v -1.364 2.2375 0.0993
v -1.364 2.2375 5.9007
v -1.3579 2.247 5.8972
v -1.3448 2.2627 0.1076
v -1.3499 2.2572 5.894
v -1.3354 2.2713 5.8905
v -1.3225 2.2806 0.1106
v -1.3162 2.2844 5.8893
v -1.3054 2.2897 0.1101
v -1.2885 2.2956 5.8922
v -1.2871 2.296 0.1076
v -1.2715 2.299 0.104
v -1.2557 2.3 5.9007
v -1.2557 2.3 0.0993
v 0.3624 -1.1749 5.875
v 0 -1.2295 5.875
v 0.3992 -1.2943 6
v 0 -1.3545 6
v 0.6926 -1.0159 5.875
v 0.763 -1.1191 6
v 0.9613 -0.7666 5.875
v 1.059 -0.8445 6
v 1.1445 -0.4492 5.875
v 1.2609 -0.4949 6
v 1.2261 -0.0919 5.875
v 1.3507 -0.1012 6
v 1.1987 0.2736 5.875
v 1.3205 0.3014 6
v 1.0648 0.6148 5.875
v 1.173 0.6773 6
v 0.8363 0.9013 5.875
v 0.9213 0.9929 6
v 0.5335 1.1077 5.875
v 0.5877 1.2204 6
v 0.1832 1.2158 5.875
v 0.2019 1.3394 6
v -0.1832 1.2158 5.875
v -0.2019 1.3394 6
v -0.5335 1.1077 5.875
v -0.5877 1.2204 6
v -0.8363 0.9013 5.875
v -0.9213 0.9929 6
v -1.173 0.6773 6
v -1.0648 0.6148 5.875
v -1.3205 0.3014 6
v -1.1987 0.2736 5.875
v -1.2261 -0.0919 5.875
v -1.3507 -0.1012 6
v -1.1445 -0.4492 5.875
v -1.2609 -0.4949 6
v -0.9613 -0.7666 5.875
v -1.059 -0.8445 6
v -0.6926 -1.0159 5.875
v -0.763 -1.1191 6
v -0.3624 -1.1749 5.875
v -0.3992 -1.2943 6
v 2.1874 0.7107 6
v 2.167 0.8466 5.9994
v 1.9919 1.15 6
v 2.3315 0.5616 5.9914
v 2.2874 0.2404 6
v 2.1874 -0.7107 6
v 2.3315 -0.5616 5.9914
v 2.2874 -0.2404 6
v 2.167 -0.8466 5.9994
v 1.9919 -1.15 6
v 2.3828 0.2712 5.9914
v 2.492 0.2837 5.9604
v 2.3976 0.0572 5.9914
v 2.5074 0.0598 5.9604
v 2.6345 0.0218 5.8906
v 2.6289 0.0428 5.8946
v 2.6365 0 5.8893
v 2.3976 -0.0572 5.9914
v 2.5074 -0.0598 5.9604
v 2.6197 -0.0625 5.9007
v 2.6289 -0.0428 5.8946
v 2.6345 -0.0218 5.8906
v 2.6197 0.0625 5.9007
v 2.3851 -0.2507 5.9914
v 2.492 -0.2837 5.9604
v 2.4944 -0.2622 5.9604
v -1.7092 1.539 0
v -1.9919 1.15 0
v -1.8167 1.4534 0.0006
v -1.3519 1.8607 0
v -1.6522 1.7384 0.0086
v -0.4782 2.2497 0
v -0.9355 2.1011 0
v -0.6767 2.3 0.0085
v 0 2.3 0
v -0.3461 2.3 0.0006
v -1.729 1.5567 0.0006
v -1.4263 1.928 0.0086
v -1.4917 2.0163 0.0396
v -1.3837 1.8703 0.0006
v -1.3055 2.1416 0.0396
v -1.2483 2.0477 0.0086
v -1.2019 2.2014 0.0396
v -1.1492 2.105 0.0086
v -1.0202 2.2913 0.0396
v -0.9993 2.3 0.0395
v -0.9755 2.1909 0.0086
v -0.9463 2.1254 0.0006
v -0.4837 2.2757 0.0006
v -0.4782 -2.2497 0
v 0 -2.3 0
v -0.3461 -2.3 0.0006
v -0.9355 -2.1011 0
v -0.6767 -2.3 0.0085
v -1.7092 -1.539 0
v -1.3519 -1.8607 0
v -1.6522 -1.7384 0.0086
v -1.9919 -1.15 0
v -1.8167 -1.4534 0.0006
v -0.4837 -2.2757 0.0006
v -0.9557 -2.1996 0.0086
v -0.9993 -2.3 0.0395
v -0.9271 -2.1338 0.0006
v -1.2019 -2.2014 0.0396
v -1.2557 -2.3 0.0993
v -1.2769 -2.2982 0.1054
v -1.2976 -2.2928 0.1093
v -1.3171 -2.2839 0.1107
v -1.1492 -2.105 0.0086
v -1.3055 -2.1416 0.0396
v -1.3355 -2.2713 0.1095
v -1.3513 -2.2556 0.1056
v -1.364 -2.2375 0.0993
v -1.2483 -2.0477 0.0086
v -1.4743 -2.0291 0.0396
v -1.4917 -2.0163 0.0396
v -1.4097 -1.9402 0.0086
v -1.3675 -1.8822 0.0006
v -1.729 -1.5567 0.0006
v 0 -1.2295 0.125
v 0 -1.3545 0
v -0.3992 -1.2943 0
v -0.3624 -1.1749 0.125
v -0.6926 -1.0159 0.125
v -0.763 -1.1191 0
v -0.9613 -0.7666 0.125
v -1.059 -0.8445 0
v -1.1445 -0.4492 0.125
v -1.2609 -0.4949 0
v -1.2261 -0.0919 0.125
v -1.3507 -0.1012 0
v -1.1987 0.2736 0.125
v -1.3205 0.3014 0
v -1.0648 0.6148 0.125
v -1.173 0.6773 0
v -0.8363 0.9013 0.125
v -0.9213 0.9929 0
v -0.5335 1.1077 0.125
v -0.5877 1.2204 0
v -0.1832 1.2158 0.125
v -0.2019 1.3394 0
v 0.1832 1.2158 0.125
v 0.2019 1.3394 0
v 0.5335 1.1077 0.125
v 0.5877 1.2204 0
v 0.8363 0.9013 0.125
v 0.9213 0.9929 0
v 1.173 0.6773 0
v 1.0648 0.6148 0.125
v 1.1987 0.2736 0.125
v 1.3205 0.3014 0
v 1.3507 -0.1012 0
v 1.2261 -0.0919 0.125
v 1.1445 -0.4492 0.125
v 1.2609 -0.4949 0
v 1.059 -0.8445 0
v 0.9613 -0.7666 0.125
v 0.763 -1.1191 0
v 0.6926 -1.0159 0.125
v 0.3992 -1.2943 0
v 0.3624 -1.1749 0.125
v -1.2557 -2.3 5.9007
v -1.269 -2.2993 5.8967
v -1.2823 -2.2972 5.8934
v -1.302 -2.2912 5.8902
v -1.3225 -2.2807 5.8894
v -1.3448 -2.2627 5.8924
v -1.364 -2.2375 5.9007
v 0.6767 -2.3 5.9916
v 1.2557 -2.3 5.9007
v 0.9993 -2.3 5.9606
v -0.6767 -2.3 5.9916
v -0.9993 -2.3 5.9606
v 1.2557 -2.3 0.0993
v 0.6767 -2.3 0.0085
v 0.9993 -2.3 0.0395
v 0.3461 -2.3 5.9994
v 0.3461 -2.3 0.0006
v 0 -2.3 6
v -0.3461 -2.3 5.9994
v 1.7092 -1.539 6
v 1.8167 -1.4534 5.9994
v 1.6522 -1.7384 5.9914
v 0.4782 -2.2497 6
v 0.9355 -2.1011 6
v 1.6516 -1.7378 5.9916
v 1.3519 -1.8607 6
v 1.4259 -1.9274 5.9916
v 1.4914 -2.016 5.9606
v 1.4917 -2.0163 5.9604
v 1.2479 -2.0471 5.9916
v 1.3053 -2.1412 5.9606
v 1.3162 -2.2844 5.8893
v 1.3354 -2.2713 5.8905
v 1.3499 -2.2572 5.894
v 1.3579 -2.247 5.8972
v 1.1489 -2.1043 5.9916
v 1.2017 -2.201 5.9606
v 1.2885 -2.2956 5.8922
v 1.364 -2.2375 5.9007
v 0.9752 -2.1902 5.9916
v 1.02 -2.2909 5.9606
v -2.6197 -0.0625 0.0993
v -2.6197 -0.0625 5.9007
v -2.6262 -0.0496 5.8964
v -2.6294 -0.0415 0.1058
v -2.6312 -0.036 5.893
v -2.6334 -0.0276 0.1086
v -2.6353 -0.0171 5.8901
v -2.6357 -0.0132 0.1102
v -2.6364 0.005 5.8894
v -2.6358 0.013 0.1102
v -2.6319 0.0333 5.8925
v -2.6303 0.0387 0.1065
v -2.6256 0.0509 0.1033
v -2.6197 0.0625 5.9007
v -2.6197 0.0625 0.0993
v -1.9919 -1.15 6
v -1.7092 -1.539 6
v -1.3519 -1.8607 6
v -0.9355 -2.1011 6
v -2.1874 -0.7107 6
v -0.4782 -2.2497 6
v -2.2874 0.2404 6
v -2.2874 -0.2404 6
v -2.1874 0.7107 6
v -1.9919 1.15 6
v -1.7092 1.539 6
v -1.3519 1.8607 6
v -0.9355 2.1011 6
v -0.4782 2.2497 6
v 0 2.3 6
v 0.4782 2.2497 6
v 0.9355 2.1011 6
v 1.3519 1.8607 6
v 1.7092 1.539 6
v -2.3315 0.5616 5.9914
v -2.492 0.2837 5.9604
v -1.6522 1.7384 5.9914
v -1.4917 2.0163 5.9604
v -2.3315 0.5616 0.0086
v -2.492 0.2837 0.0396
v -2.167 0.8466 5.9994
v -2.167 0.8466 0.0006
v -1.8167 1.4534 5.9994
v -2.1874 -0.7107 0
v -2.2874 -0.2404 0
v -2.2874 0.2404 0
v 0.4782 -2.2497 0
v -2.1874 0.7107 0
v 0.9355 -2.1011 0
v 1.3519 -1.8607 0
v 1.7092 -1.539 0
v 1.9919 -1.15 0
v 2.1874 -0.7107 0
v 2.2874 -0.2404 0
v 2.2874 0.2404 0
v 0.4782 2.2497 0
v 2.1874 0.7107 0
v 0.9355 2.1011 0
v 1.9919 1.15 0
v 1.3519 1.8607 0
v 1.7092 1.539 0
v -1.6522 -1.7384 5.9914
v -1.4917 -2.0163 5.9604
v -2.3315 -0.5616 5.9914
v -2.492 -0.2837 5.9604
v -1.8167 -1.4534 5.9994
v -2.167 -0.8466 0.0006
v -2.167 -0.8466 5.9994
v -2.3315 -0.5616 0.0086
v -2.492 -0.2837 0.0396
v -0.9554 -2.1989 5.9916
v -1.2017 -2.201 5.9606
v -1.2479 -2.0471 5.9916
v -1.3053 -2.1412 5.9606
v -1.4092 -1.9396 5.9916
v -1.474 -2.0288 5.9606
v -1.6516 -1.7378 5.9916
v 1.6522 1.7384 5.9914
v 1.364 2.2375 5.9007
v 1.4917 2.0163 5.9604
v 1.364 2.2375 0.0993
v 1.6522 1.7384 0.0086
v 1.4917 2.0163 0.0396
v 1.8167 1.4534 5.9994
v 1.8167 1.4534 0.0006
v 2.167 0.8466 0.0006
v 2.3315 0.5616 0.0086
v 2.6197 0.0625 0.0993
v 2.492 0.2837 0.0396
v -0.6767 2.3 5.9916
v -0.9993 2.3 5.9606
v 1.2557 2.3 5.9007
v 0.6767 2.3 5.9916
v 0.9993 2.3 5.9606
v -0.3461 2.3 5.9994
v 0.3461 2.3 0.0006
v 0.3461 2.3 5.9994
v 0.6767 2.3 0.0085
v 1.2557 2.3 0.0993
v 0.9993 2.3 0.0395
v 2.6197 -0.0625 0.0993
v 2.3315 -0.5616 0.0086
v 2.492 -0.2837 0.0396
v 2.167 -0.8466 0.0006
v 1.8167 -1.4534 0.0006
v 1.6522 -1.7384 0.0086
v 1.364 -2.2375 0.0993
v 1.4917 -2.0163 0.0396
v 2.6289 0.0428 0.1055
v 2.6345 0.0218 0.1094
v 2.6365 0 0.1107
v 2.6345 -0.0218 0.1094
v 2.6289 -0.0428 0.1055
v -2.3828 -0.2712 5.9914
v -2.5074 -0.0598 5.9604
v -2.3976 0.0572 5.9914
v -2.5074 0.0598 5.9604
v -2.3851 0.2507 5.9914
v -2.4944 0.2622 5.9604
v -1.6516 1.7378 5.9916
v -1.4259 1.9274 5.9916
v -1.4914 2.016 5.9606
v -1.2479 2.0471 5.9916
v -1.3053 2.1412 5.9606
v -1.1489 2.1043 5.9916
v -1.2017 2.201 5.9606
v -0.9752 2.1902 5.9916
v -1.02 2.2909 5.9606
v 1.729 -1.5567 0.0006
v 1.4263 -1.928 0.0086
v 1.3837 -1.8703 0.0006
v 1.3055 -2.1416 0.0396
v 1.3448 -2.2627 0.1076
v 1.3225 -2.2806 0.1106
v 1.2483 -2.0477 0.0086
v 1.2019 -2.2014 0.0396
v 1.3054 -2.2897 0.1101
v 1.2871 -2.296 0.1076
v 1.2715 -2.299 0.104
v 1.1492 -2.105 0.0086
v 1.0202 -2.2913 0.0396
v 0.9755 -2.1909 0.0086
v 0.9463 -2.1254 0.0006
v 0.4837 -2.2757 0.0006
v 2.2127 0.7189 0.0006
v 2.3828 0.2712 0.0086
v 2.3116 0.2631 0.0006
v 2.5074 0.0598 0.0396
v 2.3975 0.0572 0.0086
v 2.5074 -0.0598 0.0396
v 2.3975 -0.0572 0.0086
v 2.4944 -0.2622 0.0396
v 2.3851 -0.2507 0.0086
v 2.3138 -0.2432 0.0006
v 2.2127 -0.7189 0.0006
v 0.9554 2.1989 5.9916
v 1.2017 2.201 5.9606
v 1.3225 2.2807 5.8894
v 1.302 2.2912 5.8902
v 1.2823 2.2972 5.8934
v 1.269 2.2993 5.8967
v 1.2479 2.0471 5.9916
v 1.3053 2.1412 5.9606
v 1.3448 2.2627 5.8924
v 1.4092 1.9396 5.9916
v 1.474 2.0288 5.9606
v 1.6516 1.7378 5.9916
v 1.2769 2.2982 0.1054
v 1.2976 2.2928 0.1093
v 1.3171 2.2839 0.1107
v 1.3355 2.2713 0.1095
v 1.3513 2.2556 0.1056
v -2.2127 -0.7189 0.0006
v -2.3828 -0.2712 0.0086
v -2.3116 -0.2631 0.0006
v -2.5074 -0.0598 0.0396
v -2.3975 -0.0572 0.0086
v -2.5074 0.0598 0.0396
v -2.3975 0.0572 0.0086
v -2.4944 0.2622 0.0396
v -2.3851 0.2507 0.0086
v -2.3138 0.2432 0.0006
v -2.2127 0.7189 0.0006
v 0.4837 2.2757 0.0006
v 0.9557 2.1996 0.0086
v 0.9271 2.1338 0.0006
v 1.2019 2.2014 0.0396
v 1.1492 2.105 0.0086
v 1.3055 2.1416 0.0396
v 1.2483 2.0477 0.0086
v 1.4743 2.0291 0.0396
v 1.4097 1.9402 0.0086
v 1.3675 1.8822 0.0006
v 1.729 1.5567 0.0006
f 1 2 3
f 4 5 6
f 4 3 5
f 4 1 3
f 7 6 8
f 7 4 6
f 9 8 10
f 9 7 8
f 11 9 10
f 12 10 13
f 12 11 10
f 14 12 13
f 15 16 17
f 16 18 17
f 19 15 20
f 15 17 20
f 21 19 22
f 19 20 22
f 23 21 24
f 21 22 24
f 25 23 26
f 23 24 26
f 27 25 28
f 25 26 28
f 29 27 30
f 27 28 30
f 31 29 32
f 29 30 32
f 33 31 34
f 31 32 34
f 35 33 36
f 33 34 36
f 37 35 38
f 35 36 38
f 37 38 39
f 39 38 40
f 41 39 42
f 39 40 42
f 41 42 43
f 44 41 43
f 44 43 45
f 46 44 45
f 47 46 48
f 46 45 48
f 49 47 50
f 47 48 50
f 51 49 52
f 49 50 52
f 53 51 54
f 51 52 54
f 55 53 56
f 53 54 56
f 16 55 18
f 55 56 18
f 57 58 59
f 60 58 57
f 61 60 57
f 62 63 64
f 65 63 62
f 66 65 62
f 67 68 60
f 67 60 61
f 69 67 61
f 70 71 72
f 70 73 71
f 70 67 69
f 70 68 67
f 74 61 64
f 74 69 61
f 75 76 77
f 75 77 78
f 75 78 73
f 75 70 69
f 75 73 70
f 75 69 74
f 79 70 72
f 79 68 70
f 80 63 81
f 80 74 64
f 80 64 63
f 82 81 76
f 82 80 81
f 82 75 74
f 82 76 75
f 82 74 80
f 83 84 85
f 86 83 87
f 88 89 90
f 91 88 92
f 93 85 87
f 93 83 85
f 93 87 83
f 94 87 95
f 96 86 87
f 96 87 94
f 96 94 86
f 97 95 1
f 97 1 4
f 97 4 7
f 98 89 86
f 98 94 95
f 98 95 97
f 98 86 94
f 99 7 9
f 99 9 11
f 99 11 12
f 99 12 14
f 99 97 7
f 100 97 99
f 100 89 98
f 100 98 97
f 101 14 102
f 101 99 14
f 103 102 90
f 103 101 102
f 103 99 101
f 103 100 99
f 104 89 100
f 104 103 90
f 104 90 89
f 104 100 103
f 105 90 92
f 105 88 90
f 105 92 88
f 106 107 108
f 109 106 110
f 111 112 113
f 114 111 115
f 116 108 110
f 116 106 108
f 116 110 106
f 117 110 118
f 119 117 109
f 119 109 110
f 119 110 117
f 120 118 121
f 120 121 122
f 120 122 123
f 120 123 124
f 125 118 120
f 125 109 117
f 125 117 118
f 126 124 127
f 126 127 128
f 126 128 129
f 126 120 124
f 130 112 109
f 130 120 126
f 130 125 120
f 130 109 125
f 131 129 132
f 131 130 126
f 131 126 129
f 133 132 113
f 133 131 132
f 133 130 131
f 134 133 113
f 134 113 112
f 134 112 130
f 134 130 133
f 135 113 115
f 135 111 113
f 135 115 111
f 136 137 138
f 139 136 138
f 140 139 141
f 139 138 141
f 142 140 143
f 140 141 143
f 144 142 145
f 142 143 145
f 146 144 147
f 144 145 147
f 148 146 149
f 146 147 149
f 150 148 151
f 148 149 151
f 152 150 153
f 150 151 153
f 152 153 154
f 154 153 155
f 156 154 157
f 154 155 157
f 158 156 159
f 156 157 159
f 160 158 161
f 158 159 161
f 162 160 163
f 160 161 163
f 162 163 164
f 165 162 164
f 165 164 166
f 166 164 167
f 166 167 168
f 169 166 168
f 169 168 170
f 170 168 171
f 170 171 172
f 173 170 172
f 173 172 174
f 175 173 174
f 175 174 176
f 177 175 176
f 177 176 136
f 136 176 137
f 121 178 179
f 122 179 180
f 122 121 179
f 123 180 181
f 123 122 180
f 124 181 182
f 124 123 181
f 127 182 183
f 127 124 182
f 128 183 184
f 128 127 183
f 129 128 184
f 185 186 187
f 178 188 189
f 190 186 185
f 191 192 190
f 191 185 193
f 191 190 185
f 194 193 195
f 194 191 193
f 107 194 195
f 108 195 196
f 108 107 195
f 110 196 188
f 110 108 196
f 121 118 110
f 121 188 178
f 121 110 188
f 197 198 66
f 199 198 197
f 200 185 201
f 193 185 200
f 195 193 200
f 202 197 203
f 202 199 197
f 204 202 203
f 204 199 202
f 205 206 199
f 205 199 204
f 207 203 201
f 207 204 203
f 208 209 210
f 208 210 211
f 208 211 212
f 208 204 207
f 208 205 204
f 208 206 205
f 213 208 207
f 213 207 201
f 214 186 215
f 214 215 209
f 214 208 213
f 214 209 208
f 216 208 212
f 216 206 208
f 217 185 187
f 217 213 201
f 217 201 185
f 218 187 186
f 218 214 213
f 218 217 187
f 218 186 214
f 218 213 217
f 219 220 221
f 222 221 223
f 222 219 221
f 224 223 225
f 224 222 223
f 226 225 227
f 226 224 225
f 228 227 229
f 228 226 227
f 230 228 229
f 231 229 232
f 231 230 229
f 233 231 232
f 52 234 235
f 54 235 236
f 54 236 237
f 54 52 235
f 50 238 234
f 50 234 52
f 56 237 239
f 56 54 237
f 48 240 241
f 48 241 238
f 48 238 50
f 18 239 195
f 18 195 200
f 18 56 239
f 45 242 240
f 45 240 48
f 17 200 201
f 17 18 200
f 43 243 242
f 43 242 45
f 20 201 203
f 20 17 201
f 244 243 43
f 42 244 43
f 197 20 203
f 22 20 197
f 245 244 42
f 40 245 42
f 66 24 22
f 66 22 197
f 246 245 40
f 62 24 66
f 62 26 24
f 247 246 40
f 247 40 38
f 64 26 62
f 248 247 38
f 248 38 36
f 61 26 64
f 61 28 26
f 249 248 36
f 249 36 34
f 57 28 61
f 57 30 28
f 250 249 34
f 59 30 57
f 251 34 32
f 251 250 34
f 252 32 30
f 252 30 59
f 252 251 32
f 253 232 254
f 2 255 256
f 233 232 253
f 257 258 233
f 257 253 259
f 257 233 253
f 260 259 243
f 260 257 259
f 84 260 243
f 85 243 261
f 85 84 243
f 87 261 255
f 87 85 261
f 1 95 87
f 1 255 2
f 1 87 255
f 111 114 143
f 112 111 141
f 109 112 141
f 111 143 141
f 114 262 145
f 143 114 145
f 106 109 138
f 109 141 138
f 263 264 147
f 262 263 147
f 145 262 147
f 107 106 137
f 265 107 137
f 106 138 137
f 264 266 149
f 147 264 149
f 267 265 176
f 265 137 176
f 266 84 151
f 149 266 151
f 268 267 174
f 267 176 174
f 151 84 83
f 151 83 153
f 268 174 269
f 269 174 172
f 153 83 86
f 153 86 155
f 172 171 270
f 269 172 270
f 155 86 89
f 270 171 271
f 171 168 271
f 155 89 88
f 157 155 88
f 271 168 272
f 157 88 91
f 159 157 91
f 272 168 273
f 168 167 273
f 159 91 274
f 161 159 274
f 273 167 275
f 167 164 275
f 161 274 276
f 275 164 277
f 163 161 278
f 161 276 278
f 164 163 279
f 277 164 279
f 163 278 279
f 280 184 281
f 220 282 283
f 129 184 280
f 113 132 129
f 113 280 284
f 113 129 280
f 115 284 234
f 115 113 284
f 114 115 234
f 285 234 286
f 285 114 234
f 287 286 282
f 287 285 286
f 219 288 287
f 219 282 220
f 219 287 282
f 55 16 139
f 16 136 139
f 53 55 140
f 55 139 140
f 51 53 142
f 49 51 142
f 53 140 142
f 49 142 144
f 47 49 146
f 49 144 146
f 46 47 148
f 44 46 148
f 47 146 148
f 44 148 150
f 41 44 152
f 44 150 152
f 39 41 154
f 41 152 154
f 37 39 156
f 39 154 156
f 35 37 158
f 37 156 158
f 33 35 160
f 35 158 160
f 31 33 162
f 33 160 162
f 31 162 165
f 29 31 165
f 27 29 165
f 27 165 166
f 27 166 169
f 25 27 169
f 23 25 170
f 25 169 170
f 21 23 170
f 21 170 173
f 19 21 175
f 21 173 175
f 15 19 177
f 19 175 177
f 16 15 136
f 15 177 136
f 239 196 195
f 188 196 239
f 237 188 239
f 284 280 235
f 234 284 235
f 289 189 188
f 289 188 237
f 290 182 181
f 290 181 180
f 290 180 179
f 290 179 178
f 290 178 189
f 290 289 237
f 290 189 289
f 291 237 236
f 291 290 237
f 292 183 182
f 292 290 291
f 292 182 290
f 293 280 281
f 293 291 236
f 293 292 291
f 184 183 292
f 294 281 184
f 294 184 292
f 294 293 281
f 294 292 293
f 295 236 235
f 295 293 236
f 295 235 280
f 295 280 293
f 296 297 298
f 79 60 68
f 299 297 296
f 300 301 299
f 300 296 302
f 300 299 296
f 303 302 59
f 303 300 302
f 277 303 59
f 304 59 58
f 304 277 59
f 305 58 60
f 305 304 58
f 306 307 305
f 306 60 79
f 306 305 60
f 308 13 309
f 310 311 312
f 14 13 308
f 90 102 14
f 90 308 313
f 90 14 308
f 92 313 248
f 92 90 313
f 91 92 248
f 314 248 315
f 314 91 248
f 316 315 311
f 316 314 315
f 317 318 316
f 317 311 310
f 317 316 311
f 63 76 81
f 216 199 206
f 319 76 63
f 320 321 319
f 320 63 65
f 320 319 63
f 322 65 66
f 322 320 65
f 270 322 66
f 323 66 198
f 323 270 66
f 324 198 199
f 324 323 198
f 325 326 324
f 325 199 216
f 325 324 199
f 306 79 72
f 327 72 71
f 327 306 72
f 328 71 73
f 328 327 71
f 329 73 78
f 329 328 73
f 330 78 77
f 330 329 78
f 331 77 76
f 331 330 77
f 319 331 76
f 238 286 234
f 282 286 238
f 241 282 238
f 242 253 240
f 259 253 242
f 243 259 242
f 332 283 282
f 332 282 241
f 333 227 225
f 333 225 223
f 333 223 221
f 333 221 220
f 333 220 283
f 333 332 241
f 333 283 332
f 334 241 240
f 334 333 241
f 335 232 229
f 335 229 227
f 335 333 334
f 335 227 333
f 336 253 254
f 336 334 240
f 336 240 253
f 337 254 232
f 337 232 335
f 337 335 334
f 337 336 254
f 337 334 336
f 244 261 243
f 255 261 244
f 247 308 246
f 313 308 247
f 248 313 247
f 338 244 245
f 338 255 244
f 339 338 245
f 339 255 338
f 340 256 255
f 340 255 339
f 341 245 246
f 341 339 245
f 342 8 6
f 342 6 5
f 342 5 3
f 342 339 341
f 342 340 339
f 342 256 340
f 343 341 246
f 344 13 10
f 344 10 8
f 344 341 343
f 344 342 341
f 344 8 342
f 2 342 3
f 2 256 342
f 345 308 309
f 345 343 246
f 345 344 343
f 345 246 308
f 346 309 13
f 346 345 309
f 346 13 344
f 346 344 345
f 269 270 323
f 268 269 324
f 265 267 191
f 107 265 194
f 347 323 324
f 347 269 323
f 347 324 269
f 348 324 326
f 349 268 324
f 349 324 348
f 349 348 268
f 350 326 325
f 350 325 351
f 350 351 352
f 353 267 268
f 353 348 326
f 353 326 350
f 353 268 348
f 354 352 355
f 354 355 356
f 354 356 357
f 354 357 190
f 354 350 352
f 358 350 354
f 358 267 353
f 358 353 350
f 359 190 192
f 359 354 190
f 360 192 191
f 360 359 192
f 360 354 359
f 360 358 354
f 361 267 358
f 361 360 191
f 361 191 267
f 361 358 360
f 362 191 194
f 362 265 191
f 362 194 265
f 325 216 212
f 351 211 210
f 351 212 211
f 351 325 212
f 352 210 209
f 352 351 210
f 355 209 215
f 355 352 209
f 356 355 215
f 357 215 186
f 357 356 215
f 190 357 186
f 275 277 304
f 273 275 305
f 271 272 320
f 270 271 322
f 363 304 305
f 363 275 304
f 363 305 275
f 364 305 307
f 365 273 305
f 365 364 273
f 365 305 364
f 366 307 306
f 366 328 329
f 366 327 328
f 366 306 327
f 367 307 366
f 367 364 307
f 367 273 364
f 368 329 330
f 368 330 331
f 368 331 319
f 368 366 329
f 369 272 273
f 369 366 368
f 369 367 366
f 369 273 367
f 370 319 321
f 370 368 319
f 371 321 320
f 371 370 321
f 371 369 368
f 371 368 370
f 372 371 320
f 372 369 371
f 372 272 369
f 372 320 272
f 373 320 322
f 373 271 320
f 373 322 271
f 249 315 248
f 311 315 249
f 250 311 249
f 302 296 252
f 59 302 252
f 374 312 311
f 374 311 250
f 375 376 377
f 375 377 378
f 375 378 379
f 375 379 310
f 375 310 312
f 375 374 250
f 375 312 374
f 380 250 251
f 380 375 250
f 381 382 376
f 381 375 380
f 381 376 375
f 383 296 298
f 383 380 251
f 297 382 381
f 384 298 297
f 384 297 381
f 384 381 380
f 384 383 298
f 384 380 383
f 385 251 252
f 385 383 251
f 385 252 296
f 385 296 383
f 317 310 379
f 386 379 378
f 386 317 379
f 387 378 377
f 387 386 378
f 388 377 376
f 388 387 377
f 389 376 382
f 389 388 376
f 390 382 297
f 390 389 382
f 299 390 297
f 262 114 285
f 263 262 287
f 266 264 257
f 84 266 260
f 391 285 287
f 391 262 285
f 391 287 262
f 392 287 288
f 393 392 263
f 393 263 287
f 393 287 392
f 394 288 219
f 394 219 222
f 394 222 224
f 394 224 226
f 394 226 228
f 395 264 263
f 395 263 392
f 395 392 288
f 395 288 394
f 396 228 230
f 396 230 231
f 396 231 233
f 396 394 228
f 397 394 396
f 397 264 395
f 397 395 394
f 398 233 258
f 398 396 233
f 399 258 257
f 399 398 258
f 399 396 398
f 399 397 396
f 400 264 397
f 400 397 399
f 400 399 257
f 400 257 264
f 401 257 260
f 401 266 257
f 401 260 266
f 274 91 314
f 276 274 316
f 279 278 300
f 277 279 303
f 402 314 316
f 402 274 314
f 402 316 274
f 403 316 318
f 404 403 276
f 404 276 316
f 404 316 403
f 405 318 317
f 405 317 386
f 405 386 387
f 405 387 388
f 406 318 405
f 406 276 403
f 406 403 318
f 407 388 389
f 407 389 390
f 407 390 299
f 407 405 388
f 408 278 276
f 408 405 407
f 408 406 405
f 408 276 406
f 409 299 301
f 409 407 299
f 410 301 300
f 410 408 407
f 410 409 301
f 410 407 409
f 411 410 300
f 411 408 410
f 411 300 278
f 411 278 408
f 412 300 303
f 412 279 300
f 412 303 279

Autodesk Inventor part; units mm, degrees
ref_plane "YZ Plane" through (0, 0, 0) normal (1, 0, 0) x (0, 1, 0)
ref_plane "XZ Plane" through (0, 0, 0) normal (0, 1, 0) x (-1, 0, 0)
ref_plane "XY Plane" through (0, 0, 0) normal (0, 0, 1) x (1, 0, 0)
sketch "Sketch1" plane through (0, 0, 0) normal (0, 0, 1) x (1, 0, 0)
  line L0 (2.6197, -0.0625) -> (1.364, -2.2375)
  line L1 (1.2557, -2.3) -> (-1.2557, -2.3)
  line L2 (-1.364, -2.2375) -> (-2.6197, -0.0625)
  line L3 (-2.6197, 0.0625) -> (-1.364, 2.2375)
  line L4 (-1.2557, 2.3) -> (1.2557, 2.3)
  line L5 (1.364, 2.2375) -> (2.6197, 0.0625)
  arc A0 (-1.2557, 2.3) -> (-1.364, 2.2375) centre (-1.2557, 2.175) ccw
  arc A1 (-2.6197, 0.0625) -> (-2.6197, -0.0625) centre (-2.5115, 0) ccw
  arc A2 (-1.364, -2.2375) -> (-1.2557, -2.3) centre (-1.2557, -2.175) ccw
  arc A3 (1.2557, -2.3) -> (1.364, -2.2375) centre (1.2557, -2.175) ccw
  arc A4 (2.6197, -0.0625) -> (2.6197, 0.0625) centre (2.5115, 0) ccw
  arc A5 (1.364, 2.2375) -> (1.2557, 2.3) centre (1.2557, 2.175) ccw
  point P0 (0, 0)
  point P1 (2.6558, 0)
  point P2 (1.3279, -2.3)
  point P3 (-1.3279, -2.3)
  point P4 (-2.6558, 0)
  point P5 (-1.3279, 2.3)
  point P6 (1.3279, 2.3)
  dimension "d36" = 4.6
  dimension "d37" = 0.125
extrude "Extrusion1" add sketch "Sketch1" along normal blind 6
sketch "草圖5" plane through (0, 0, 6) normal (0, 0, 1) x (1, 0, 0)
  point P0 (0, 0)
  point P1 (0, 0)
hole "孔2" at (0, 0, 6) direction (0, 0, -1) diameter 2.459 end through all thread size "M3x0.5" class "6H" standard "ANSI Metric M Profile"
chamfer "倒角2" distance 0.125 angle 45 2 edges at (0, 1.2295, 6) (0, 1.2295, 0)
sketch "草圖6" plane through (0, 0, 0) normal (0, 1, 0) x (-1, 0, 0)
  line L0 (-2.3, 0) -> (-2.8, 0)
  line L1 (-2.8, 6) -> (-2.3, 6)
  line L2 (-2.8, 6) -> (-2.8, 5.7)
  line L3 (-2.8, 0) -> (-2.8, 0.3)
  arc A0 (-2.3, 6) -> (-2.8, 5.7) centre (-2.3, 5.4333) ccw
  arc A1 (-2.8, 0.3) -> (-2.3, 0) centre (-2.3, 0.5667) ccw
  line L4 (0, 0) -> (0, 6)
  dimension "d48" = 6
  dimension "d50" = 2.3
  dimension "d51" = 2.3
  dimension "d52" = 0.5
  dimension "d53" = 0.3
  dimension "d54" = 0.3
revolve "迴轉2" cut sketch "草圖6" angle 360 about axis through (0, 0, 0) along (0, 0, 1)
properties part number "nut_rod_M3_8"
